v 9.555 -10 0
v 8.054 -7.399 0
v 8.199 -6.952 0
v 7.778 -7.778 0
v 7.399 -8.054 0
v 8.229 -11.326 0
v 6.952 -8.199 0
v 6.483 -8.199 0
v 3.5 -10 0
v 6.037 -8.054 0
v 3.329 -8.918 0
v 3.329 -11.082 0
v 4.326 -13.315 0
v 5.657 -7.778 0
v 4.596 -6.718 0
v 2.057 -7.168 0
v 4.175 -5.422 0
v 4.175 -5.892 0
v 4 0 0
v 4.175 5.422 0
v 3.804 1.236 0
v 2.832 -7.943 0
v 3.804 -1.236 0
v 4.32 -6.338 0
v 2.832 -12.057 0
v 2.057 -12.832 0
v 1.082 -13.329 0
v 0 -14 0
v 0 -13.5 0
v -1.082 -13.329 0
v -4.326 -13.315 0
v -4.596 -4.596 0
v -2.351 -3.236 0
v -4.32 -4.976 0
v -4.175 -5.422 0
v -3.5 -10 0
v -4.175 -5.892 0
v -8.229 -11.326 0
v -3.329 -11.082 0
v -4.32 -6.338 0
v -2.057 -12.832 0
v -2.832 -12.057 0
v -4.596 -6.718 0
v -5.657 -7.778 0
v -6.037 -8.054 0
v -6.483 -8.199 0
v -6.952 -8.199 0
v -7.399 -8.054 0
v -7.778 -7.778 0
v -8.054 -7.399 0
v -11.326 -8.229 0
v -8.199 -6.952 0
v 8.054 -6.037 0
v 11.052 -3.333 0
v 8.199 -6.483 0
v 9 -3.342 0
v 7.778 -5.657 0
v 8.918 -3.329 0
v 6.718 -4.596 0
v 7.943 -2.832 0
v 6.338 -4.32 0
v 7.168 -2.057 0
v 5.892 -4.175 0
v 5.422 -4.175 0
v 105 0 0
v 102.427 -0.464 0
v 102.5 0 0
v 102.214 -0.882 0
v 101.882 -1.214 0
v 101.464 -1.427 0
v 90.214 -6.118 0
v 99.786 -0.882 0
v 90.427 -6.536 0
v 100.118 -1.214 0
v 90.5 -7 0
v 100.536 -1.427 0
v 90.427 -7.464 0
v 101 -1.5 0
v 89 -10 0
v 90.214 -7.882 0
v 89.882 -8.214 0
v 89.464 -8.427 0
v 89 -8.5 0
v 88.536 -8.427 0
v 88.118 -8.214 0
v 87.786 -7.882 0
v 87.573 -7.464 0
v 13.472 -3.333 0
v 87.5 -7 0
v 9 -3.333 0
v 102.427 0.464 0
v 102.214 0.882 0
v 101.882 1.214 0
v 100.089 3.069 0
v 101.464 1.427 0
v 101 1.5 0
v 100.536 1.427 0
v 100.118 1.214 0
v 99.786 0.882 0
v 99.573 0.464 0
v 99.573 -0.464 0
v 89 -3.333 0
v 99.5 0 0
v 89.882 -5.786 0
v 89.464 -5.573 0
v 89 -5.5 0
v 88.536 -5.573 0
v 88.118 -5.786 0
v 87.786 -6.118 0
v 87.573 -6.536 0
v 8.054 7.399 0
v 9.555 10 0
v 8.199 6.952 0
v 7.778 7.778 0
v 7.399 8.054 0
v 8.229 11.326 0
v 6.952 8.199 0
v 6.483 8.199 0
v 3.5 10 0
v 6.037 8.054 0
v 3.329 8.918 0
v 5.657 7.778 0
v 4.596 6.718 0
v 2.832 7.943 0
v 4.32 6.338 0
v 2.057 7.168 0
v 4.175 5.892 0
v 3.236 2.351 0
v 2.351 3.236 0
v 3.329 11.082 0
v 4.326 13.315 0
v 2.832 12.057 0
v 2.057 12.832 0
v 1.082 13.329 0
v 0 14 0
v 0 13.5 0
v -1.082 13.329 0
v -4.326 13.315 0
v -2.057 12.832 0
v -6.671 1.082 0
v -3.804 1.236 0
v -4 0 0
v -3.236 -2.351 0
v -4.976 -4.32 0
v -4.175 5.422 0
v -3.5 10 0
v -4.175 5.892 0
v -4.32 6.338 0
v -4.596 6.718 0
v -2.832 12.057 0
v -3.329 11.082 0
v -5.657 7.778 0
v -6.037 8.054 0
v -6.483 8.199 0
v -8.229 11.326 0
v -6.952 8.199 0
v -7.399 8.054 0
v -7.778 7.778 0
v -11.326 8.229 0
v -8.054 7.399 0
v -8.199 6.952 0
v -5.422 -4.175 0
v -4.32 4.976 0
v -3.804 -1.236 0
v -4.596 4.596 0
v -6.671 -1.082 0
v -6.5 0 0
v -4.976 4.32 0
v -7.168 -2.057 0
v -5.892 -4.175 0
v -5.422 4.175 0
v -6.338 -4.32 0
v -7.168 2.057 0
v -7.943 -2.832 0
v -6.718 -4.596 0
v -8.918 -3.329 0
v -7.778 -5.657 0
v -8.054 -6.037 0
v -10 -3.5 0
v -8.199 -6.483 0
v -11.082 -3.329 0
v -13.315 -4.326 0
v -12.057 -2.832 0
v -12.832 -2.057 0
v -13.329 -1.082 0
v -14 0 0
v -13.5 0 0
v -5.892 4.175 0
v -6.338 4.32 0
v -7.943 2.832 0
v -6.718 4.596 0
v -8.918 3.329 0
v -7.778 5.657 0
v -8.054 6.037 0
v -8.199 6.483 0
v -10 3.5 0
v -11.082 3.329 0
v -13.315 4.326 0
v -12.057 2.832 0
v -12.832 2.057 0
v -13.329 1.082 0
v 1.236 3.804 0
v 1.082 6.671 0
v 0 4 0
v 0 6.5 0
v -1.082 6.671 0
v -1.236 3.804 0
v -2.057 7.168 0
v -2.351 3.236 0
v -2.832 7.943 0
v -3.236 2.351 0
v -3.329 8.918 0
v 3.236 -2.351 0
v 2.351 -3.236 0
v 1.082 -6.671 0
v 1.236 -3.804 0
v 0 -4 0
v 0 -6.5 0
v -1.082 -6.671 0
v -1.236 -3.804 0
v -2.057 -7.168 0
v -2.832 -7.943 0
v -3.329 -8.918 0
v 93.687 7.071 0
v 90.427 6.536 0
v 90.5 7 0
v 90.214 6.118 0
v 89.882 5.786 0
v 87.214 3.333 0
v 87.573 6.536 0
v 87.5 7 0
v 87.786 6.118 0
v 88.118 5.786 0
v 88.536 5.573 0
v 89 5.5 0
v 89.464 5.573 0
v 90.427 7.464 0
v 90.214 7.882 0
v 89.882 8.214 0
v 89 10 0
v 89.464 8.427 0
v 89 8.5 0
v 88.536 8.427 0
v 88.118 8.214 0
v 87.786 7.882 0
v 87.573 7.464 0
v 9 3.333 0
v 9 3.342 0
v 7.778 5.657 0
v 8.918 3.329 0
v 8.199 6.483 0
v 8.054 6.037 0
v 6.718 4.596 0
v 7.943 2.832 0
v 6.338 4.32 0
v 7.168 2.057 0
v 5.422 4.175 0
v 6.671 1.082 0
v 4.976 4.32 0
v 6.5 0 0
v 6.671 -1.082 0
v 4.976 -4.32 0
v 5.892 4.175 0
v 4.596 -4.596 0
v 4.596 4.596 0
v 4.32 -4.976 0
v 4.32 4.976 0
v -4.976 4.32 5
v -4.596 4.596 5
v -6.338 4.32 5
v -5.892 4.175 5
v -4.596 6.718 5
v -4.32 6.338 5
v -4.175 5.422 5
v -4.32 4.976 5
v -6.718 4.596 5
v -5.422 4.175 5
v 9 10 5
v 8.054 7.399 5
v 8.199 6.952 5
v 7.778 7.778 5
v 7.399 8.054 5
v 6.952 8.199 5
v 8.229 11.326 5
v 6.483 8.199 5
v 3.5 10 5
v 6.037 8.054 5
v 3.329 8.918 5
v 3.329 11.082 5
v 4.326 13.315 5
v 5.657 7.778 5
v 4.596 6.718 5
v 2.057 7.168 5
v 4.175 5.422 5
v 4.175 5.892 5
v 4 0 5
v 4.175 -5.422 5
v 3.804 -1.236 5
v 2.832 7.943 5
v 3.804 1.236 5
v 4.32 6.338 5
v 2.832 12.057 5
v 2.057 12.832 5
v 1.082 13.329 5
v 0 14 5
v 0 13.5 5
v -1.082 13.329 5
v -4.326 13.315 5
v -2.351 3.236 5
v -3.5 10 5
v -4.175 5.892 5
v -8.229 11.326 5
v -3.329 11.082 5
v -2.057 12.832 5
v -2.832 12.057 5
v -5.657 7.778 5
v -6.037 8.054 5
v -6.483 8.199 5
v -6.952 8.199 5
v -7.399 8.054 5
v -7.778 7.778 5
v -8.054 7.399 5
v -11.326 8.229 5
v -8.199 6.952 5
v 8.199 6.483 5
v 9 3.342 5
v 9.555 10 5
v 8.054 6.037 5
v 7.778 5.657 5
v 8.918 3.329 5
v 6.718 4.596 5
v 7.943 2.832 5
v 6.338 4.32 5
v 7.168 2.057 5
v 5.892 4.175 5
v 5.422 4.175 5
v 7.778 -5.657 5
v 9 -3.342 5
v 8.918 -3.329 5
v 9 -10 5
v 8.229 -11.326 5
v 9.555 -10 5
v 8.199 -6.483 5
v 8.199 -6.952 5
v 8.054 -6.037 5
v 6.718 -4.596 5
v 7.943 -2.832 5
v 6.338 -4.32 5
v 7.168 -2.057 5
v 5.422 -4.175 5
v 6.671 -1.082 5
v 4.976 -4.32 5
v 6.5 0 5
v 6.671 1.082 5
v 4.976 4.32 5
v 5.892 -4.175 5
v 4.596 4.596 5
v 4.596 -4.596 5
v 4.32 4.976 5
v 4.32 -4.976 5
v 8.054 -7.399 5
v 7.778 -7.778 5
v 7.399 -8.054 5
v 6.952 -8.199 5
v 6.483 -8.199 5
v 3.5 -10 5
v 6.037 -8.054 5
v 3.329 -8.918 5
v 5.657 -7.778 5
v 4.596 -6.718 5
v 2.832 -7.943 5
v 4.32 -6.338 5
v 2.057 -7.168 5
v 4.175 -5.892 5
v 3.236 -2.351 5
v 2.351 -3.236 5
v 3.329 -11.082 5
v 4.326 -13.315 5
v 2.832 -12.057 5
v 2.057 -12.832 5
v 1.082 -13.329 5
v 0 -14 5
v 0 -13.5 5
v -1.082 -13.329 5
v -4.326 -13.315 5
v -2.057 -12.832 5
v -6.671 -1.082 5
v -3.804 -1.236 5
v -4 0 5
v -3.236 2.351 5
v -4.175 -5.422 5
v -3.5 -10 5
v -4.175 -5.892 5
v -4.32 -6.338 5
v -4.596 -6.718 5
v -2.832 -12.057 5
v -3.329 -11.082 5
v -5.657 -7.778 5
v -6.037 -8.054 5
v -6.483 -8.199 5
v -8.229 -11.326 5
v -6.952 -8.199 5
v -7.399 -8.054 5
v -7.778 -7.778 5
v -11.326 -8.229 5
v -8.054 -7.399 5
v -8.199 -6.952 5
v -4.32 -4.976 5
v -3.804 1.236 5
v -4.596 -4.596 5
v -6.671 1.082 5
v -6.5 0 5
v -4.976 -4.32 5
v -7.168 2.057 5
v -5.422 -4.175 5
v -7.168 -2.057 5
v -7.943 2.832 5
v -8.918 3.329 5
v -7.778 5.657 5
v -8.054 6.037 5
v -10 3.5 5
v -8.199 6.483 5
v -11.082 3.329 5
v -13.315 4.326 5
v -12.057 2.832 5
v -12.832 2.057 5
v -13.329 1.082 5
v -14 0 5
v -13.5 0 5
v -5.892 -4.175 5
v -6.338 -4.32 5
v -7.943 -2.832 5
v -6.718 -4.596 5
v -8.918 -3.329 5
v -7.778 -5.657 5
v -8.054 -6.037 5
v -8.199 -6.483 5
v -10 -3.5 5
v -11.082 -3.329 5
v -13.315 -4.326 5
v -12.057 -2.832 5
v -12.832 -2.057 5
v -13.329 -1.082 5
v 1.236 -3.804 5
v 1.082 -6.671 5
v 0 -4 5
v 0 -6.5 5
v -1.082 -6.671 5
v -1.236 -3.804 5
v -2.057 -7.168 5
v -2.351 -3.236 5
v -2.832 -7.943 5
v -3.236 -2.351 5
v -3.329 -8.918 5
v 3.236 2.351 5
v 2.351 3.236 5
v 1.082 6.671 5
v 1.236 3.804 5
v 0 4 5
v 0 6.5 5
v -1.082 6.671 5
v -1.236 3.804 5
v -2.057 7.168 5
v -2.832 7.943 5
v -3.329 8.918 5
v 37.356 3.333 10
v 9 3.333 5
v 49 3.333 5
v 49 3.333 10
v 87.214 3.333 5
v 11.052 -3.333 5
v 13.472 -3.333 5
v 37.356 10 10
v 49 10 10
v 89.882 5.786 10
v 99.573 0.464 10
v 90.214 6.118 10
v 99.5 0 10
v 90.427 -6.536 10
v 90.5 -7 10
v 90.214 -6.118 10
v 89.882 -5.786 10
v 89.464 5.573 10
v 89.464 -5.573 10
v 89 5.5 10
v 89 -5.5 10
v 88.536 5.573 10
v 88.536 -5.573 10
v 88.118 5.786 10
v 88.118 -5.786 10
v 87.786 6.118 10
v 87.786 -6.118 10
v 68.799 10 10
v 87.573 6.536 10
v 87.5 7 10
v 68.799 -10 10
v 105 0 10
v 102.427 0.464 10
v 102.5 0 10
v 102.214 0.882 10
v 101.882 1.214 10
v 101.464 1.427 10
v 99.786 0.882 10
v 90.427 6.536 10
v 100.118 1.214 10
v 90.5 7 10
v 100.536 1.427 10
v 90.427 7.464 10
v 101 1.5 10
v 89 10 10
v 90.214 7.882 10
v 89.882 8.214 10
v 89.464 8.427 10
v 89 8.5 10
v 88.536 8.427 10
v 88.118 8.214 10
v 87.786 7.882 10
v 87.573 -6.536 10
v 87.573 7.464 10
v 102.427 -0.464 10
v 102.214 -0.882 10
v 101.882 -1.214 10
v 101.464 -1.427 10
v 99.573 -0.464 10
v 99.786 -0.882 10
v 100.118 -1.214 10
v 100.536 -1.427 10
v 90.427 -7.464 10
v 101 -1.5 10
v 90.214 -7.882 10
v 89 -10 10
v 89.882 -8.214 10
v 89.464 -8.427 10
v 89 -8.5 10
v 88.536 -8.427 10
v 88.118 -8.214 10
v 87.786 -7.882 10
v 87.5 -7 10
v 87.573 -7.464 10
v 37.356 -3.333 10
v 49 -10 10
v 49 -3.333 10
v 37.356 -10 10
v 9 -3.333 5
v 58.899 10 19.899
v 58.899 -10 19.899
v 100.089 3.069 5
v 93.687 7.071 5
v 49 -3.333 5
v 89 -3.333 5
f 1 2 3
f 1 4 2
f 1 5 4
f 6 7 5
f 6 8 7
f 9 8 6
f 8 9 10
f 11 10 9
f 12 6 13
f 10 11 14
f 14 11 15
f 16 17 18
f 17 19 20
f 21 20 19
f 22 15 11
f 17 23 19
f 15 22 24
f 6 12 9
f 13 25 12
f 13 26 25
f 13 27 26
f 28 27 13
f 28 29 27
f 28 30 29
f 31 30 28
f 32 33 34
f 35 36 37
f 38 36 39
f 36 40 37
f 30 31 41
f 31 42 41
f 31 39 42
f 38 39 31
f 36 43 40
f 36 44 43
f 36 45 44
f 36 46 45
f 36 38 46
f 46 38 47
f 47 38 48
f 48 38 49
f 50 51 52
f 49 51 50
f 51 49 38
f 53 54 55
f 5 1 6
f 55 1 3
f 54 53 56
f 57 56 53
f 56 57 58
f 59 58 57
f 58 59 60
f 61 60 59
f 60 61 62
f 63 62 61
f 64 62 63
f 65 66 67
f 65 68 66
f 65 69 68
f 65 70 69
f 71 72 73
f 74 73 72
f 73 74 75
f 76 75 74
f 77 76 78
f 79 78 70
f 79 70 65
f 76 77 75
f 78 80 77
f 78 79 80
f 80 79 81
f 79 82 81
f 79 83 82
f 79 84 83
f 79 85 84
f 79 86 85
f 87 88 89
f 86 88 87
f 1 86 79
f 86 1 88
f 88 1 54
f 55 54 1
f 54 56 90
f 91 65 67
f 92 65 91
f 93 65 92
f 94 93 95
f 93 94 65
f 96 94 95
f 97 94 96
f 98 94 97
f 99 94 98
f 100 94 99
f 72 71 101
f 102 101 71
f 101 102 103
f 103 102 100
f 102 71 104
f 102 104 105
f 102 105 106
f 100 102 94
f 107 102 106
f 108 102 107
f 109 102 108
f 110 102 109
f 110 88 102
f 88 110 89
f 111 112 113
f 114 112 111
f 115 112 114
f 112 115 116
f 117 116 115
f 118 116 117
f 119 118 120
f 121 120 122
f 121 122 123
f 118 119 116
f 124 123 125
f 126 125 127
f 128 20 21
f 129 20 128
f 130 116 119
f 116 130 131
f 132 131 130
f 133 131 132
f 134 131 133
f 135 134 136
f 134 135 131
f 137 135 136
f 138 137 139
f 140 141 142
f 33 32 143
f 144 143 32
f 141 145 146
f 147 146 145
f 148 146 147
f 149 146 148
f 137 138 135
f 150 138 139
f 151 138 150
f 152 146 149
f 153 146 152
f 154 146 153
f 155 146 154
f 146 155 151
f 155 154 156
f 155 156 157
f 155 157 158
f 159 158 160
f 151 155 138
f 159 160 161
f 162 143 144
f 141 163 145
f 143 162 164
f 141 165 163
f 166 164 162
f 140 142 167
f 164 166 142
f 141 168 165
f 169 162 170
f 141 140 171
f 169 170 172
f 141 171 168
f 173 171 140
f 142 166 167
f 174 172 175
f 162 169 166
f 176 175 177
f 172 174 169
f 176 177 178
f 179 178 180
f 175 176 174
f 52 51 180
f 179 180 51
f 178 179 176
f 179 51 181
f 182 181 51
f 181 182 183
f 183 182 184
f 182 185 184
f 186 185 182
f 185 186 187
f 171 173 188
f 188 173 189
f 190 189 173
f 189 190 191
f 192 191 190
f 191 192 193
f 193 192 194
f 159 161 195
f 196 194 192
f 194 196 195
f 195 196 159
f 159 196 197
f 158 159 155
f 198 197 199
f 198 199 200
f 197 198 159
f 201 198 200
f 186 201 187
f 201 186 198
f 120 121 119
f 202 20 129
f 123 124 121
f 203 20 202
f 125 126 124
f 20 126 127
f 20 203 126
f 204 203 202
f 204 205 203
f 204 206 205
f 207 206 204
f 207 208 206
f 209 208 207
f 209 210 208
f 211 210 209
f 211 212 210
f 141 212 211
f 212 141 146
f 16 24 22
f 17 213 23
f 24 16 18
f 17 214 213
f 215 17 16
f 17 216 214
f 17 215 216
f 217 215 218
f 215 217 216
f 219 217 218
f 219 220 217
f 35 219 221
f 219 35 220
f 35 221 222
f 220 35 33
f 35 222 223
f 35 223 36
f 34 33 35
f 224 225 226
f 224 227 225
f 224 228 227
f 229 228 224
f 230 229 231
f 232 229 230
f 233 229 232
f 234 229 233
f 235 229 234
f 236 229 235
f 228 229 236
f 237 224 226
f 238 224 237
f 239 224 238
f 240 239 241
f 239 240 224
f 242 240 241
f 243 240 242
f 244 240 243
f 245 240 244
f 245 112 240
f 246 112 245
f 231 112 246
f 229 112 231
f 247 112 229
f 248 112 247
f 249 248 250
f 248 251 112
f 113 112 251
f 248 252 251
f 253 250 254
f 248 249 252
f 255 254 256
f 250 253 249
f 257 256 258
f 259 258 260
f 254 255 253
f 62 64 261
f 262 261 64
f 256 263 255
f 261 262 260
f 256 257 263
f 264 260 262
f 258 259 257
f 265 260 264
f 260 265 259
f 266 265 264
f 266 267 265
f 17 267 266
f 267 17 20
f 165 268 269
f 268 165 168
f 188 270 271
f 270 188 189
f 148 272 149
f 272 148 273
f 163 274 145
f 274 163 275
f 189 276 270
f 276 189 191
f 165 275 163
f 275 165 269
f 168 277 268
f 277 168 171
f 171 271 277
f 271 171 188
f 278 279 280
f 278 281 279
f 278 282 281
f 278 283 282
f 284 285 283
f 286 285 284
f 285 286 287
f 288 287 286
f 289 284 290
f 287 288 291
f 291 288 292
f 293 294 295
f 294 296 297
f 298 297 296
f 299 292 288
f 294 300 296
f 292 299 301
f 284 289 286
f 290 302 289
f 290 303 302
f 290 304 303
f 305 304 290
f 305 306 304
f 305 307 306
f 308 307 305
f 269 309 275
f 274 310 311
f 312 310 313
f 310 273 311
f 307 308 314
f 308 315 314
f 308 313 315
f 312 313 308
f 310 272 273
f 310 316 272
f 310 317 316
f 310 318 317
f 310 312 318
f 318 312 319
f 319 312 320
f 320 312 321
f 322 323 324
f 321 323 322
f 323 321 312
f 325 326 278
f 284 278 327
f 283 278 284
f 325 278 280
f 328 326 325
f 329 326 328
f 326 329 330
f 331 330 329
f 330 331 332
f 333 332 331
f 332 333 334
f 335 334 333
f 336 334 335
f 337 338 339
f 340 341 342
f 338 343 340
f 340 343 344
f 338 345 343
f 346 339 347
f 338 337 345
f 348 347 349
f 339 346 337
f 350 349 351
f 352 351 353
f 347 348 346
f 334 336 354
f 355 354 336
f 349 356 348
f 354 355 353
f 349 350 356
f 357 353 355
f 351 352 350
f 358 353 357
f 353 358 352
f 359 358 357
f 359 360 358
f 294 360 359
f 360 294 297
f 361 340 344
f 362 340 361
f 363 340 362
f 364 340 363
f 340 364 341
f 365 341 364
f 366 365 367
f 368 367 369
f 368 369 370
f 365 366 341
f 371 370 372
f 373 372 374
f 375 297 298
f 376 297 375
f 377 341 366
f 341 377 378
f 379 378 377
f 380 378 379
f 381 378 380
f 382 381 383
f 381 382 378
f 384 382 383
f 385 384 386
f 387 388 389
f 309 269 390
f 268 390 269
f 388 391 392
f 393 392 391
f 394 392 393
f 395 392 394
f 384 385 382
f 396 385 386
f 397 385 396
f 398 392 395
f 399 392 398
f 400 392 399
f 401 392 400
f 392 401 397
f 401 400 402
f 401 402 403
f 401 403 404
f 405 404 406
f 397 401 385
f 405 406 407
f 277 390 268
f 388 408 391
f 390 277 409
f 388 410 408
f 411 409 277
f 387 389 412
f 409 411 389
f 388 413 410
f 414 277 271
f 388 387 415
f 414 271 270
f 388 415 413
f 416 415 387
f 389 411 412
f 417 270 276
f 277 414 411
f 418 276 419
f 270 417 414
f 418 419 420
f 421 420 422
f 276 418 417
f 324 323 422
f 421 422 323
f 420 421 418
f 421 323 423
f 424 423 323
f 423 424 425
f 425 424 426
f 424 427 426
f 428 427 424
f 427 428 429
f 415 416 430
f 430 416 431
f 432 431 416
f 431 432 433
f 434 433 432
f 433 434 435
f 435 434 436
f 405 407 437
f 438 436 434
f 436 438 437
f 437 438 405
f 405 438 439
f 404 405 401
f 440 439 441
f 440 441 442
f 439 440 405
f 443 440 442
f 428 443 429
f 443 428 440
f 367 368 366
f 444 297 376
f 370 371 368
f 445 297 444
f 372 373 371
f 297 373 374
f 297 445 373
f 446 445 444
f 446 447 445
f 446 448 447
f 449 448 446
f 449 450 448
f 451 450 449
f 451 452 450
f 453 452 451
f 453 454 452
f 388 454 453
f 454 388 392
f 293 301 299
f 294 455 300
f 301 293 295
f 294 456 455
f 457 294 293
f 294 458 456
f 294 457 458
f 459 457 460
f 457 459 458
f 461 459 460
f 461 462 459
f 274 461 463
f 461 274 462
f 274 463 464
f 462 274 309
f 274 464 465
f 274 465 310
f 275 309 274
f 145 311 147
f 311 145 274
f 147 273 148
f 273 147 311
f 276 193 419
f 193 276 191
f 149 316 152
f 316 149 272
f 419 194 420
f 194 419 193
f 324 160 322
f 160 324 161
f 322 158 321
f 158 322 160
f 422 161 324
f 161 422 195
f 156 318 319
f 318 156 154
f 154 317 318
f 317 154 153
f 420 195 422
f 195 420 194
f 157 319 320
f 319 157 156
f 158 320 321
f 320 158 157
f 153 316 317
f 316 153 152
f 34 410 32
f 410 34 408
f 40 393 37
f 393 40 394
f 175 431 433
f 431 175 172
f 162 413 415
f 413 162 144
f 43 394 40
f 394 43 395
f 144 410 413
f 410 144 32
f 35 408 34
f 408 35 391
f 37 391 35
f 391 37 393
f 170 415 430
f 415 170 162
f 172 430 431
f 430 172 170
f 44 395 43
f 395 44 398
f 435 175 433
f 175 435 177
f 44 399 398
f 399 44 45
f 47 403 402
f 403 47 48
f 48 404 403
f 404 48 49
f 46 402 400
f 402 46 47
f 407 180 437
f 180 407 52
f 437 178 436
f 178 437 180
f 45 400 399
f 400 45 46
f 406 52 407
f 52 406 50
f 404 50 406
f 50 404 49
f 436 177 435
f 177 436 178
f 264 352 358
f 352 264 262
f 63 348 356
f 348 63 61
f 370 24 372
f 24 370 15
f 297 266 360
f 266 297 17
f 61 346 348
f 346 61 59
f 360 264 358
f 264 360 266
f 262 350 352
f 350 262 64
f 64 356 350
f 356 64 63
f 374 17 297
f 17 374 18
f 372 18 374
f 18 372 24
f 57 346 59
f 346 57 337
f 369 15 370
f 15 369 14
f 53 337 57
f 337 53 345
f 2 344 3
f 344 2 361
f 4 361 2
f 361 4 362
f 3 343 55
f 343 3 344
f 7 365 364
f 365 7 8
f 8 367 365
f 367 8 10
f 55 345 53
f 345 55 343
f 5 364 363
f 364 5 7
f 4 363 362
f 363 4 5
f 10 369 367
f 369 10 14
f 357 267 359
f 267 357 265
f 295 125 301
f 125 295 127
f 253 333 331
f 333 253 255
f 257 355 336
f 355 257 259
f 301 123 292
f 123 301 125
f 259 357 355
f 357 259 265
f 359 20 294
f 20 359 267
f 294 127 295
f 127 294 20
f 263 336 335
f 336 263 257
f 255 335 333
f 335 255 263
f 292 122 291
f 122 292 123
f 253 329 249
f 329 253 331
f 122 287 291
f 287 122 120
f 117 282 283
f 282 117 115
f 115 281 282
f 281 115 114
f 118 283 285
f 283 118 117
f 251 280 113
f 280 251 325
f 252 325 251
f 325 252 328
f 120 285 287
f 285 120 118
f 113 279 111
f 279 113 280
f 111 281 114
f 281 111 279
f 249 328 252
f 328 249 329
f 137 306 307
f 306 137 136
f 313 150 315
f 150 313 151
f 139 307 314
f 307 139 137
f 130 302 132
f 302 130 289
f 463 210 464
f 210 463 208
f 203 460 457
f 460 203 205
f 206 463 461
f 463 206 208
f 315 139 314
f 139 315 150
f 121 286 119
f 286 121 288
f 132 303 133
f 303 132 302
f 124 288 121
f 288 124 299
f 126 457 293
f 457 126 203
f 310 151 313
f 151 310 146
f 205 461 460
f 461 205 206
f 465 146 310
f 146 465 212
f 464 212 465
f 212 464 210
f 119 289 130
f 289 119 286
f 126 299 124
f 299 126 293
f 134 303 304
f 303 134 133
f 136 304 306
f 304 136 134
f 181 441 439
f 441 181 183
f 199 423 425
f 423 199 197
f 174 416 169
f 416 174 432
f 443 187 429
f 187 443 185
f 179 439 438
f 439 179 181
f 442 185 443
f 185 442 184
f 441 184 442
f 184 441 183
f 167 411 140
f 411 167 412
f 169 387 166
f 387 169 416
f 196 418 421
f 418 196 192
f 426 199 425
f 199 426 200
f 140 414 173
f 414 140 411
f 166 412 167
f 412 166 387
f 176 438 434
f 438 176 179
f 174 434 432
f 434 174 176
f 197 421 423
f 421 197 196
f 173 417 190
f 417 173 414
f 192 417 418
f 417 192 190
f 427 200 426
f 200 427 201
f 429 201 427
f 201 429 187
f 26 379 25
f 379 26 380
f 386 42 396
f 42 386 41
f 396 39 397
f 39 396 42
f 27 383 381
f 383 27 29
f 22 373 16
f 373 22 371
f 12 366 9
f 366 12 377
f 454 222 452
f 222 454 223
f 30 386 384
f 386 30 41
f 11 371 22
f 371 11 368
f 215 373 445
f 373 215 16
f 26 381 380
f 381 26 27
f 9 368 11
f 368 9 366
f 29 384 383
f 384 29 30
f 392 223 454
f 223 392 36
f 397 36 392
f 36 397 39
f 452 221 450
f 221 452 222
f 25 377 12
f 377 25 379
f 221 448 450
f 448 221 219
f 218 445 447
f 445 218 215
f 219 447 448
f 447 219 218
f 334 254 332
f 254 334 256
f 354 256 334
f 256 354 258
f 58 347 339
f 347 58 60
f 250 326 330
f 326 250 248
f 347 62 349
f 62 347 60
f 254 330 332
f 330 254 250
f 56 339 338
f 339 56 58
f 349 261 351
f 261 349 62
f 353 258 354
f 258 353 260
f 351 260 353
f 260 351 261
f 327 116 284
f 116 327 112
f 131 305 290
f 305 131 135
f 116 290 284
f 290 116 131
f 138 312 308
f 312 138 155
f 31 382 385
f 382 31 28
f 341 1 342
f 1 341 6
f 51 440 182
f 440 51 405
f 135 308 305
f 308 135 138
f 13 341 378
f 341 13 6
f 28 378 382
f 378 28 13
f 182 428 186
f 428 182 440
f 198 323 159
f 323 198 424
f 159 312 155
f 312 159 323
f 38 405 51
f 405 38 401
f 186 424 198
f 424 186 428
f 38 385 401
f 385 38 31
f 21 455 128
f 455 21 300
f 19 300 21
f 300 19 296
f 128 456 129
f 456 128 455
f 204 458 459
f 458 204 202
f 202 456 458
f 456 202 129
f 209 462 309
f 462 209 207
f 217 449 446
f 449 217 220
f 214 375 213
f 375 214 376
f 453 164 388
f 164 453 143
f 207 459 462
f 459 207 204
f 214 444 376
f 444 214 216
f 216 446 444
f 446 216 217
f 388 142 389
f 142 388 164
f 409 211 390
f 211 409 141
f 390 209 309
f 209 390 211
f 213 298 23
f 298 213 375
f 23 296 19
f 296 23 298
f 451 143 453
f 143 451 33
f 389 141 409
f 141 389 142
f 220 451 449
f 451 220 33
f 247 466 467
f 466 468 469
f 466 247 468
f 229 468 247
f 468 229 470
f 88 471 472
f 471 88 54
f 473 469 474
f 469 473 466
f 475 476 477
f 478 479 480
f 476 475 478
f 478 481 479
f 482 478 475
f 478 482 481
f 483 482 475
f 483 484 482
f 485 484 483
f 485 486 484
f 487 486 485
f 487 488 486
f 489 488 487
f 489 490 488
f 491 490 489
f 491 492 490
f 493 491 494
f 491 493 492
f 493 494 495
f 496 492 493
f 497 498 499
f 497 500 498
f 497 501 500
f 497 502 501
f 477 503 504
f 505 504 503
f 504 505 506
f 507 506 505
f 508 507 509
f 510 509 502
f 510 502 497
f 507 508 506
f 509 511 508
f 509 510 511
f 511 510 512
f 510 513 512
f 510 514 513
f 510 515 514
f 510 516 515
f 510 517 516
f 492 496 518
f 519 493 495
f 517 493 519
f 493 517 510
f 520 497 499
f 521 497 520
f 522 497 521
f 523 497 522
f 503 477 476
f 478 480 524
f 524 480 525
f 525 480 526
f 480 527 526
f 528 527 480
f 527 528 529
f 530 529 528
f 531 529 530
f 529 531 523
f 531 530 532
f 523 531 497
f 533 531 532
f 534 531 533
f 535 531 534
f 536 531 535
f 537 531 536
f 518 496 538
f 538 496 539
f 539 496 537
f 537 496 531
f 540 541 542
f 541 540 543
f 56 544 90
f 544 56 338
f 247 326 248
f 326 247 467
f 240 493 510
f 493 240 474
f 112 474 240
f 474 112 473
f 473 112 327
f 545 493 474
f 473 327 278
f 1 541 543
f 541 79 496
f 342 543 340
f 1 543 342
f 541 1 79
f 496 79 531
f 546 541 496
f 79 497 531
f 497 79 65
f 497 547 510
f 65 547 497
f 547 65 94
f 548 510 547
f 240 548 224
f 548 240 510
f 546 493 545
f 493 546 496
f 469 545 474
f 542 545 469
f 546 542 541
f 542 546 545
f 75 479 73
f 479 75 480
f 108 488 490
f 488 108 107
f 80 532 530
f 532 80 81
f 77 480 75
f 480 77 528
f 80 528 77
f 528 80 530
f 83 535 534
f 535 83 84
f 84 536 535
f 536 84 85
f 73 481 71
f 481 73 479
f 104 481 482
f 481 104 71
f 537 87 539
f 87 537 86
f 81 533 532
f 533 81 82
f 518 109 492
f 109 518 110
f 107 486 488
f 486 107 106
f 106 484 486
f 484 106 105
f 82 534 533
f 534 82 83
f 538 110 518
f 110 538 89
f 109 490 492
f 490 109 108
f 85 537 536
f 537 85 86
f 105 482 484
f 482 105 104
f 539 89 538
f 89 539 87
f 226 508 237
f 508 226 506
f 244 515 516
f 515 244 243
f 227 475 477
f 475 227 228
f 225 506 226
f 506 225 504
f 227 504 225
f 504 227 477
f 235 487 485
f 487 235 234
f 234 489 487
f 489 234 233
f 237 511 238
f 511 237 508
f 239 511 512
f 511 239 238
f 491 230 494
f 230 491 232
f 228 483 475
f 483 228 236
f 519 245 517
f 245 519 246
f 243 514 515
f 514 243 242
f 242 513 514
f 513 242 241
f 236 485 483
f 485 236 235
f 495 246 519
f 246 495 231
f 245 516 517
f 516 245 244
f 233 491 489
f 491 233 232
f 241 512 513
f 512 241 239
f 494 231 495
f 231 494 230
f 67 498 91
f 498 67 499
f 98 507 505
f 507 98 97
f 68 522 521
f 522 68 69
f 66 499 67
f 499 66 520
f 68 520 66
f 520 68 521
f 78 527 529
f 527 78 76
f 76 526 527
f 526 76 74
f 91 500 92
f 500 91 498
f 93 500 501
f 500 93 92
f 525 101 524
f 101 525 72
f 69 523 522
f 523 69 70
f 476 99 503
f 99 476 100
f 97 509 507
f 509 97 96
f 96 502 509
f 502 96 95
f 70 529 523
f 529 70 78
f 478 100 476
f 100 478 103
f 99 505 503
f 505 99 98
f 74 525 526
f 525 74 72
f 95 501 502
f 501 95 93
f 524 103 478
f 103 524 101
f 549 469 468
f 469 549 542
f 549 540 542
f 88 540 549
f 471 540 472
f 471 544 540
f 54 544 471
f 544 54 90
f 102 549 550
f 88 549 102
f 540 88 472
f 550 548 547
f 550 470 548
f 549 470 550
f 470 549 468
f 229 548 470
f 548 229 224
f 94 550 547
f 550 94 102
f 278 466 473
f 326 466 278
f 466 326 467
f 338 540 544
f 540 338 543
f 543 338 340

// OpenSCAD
$fn = 20;



difference() {
    cylinder(  5,    14,    14);
    cylinder(  5,    4,    4);
    for(a=[1:4])rotate([0,0,90*a+45]) translate([8,0,0])
    {
        cylinder(  5,    1.5,    1.5);
        translate([0,-1.5,0]) cube([1.5,3,5]);
        translate([1.5,0,0]) cylinder(  5,    1.5,    1.5);
    }
    
    for(a=[1:4])rotate([0,0,90*a]) translate([10,0,0]) cylinder(  5,    3.5,    3.5);
    translate([10 ,-20/6,0]) cube([5,20/3,5]);
}


translate([9 ,-10,0])
difference() {
union() {
cube([80,20,10]);
translate([80,0,0]) linear_extrude(10)
polygon([[0,0],[16, 10],[0,20]]);
#translate([40,0,10]) rotate([0,45,0]) cube([14,20,14]);
}
translate([80,3,0]) cylinder(  10,    1.5,    1.5);
translate([80,3+14,0]) cylinder(  10,    1.5,    1.5);
translate([80+12,3+7,0]) cylinder(  10,    1.5,    1.5,        false);

translate([0,20/3,0]) cube([40,20/3,10]);
translate([40,20/3,0]) cube([40,20/3,5]);

translate([80,20/3,0]) rotate([0,0,30]) cube([70,20/3,5]);

translate([0,0,5]) rotate([0,-10,0]) cube([30,20,10]);
}
